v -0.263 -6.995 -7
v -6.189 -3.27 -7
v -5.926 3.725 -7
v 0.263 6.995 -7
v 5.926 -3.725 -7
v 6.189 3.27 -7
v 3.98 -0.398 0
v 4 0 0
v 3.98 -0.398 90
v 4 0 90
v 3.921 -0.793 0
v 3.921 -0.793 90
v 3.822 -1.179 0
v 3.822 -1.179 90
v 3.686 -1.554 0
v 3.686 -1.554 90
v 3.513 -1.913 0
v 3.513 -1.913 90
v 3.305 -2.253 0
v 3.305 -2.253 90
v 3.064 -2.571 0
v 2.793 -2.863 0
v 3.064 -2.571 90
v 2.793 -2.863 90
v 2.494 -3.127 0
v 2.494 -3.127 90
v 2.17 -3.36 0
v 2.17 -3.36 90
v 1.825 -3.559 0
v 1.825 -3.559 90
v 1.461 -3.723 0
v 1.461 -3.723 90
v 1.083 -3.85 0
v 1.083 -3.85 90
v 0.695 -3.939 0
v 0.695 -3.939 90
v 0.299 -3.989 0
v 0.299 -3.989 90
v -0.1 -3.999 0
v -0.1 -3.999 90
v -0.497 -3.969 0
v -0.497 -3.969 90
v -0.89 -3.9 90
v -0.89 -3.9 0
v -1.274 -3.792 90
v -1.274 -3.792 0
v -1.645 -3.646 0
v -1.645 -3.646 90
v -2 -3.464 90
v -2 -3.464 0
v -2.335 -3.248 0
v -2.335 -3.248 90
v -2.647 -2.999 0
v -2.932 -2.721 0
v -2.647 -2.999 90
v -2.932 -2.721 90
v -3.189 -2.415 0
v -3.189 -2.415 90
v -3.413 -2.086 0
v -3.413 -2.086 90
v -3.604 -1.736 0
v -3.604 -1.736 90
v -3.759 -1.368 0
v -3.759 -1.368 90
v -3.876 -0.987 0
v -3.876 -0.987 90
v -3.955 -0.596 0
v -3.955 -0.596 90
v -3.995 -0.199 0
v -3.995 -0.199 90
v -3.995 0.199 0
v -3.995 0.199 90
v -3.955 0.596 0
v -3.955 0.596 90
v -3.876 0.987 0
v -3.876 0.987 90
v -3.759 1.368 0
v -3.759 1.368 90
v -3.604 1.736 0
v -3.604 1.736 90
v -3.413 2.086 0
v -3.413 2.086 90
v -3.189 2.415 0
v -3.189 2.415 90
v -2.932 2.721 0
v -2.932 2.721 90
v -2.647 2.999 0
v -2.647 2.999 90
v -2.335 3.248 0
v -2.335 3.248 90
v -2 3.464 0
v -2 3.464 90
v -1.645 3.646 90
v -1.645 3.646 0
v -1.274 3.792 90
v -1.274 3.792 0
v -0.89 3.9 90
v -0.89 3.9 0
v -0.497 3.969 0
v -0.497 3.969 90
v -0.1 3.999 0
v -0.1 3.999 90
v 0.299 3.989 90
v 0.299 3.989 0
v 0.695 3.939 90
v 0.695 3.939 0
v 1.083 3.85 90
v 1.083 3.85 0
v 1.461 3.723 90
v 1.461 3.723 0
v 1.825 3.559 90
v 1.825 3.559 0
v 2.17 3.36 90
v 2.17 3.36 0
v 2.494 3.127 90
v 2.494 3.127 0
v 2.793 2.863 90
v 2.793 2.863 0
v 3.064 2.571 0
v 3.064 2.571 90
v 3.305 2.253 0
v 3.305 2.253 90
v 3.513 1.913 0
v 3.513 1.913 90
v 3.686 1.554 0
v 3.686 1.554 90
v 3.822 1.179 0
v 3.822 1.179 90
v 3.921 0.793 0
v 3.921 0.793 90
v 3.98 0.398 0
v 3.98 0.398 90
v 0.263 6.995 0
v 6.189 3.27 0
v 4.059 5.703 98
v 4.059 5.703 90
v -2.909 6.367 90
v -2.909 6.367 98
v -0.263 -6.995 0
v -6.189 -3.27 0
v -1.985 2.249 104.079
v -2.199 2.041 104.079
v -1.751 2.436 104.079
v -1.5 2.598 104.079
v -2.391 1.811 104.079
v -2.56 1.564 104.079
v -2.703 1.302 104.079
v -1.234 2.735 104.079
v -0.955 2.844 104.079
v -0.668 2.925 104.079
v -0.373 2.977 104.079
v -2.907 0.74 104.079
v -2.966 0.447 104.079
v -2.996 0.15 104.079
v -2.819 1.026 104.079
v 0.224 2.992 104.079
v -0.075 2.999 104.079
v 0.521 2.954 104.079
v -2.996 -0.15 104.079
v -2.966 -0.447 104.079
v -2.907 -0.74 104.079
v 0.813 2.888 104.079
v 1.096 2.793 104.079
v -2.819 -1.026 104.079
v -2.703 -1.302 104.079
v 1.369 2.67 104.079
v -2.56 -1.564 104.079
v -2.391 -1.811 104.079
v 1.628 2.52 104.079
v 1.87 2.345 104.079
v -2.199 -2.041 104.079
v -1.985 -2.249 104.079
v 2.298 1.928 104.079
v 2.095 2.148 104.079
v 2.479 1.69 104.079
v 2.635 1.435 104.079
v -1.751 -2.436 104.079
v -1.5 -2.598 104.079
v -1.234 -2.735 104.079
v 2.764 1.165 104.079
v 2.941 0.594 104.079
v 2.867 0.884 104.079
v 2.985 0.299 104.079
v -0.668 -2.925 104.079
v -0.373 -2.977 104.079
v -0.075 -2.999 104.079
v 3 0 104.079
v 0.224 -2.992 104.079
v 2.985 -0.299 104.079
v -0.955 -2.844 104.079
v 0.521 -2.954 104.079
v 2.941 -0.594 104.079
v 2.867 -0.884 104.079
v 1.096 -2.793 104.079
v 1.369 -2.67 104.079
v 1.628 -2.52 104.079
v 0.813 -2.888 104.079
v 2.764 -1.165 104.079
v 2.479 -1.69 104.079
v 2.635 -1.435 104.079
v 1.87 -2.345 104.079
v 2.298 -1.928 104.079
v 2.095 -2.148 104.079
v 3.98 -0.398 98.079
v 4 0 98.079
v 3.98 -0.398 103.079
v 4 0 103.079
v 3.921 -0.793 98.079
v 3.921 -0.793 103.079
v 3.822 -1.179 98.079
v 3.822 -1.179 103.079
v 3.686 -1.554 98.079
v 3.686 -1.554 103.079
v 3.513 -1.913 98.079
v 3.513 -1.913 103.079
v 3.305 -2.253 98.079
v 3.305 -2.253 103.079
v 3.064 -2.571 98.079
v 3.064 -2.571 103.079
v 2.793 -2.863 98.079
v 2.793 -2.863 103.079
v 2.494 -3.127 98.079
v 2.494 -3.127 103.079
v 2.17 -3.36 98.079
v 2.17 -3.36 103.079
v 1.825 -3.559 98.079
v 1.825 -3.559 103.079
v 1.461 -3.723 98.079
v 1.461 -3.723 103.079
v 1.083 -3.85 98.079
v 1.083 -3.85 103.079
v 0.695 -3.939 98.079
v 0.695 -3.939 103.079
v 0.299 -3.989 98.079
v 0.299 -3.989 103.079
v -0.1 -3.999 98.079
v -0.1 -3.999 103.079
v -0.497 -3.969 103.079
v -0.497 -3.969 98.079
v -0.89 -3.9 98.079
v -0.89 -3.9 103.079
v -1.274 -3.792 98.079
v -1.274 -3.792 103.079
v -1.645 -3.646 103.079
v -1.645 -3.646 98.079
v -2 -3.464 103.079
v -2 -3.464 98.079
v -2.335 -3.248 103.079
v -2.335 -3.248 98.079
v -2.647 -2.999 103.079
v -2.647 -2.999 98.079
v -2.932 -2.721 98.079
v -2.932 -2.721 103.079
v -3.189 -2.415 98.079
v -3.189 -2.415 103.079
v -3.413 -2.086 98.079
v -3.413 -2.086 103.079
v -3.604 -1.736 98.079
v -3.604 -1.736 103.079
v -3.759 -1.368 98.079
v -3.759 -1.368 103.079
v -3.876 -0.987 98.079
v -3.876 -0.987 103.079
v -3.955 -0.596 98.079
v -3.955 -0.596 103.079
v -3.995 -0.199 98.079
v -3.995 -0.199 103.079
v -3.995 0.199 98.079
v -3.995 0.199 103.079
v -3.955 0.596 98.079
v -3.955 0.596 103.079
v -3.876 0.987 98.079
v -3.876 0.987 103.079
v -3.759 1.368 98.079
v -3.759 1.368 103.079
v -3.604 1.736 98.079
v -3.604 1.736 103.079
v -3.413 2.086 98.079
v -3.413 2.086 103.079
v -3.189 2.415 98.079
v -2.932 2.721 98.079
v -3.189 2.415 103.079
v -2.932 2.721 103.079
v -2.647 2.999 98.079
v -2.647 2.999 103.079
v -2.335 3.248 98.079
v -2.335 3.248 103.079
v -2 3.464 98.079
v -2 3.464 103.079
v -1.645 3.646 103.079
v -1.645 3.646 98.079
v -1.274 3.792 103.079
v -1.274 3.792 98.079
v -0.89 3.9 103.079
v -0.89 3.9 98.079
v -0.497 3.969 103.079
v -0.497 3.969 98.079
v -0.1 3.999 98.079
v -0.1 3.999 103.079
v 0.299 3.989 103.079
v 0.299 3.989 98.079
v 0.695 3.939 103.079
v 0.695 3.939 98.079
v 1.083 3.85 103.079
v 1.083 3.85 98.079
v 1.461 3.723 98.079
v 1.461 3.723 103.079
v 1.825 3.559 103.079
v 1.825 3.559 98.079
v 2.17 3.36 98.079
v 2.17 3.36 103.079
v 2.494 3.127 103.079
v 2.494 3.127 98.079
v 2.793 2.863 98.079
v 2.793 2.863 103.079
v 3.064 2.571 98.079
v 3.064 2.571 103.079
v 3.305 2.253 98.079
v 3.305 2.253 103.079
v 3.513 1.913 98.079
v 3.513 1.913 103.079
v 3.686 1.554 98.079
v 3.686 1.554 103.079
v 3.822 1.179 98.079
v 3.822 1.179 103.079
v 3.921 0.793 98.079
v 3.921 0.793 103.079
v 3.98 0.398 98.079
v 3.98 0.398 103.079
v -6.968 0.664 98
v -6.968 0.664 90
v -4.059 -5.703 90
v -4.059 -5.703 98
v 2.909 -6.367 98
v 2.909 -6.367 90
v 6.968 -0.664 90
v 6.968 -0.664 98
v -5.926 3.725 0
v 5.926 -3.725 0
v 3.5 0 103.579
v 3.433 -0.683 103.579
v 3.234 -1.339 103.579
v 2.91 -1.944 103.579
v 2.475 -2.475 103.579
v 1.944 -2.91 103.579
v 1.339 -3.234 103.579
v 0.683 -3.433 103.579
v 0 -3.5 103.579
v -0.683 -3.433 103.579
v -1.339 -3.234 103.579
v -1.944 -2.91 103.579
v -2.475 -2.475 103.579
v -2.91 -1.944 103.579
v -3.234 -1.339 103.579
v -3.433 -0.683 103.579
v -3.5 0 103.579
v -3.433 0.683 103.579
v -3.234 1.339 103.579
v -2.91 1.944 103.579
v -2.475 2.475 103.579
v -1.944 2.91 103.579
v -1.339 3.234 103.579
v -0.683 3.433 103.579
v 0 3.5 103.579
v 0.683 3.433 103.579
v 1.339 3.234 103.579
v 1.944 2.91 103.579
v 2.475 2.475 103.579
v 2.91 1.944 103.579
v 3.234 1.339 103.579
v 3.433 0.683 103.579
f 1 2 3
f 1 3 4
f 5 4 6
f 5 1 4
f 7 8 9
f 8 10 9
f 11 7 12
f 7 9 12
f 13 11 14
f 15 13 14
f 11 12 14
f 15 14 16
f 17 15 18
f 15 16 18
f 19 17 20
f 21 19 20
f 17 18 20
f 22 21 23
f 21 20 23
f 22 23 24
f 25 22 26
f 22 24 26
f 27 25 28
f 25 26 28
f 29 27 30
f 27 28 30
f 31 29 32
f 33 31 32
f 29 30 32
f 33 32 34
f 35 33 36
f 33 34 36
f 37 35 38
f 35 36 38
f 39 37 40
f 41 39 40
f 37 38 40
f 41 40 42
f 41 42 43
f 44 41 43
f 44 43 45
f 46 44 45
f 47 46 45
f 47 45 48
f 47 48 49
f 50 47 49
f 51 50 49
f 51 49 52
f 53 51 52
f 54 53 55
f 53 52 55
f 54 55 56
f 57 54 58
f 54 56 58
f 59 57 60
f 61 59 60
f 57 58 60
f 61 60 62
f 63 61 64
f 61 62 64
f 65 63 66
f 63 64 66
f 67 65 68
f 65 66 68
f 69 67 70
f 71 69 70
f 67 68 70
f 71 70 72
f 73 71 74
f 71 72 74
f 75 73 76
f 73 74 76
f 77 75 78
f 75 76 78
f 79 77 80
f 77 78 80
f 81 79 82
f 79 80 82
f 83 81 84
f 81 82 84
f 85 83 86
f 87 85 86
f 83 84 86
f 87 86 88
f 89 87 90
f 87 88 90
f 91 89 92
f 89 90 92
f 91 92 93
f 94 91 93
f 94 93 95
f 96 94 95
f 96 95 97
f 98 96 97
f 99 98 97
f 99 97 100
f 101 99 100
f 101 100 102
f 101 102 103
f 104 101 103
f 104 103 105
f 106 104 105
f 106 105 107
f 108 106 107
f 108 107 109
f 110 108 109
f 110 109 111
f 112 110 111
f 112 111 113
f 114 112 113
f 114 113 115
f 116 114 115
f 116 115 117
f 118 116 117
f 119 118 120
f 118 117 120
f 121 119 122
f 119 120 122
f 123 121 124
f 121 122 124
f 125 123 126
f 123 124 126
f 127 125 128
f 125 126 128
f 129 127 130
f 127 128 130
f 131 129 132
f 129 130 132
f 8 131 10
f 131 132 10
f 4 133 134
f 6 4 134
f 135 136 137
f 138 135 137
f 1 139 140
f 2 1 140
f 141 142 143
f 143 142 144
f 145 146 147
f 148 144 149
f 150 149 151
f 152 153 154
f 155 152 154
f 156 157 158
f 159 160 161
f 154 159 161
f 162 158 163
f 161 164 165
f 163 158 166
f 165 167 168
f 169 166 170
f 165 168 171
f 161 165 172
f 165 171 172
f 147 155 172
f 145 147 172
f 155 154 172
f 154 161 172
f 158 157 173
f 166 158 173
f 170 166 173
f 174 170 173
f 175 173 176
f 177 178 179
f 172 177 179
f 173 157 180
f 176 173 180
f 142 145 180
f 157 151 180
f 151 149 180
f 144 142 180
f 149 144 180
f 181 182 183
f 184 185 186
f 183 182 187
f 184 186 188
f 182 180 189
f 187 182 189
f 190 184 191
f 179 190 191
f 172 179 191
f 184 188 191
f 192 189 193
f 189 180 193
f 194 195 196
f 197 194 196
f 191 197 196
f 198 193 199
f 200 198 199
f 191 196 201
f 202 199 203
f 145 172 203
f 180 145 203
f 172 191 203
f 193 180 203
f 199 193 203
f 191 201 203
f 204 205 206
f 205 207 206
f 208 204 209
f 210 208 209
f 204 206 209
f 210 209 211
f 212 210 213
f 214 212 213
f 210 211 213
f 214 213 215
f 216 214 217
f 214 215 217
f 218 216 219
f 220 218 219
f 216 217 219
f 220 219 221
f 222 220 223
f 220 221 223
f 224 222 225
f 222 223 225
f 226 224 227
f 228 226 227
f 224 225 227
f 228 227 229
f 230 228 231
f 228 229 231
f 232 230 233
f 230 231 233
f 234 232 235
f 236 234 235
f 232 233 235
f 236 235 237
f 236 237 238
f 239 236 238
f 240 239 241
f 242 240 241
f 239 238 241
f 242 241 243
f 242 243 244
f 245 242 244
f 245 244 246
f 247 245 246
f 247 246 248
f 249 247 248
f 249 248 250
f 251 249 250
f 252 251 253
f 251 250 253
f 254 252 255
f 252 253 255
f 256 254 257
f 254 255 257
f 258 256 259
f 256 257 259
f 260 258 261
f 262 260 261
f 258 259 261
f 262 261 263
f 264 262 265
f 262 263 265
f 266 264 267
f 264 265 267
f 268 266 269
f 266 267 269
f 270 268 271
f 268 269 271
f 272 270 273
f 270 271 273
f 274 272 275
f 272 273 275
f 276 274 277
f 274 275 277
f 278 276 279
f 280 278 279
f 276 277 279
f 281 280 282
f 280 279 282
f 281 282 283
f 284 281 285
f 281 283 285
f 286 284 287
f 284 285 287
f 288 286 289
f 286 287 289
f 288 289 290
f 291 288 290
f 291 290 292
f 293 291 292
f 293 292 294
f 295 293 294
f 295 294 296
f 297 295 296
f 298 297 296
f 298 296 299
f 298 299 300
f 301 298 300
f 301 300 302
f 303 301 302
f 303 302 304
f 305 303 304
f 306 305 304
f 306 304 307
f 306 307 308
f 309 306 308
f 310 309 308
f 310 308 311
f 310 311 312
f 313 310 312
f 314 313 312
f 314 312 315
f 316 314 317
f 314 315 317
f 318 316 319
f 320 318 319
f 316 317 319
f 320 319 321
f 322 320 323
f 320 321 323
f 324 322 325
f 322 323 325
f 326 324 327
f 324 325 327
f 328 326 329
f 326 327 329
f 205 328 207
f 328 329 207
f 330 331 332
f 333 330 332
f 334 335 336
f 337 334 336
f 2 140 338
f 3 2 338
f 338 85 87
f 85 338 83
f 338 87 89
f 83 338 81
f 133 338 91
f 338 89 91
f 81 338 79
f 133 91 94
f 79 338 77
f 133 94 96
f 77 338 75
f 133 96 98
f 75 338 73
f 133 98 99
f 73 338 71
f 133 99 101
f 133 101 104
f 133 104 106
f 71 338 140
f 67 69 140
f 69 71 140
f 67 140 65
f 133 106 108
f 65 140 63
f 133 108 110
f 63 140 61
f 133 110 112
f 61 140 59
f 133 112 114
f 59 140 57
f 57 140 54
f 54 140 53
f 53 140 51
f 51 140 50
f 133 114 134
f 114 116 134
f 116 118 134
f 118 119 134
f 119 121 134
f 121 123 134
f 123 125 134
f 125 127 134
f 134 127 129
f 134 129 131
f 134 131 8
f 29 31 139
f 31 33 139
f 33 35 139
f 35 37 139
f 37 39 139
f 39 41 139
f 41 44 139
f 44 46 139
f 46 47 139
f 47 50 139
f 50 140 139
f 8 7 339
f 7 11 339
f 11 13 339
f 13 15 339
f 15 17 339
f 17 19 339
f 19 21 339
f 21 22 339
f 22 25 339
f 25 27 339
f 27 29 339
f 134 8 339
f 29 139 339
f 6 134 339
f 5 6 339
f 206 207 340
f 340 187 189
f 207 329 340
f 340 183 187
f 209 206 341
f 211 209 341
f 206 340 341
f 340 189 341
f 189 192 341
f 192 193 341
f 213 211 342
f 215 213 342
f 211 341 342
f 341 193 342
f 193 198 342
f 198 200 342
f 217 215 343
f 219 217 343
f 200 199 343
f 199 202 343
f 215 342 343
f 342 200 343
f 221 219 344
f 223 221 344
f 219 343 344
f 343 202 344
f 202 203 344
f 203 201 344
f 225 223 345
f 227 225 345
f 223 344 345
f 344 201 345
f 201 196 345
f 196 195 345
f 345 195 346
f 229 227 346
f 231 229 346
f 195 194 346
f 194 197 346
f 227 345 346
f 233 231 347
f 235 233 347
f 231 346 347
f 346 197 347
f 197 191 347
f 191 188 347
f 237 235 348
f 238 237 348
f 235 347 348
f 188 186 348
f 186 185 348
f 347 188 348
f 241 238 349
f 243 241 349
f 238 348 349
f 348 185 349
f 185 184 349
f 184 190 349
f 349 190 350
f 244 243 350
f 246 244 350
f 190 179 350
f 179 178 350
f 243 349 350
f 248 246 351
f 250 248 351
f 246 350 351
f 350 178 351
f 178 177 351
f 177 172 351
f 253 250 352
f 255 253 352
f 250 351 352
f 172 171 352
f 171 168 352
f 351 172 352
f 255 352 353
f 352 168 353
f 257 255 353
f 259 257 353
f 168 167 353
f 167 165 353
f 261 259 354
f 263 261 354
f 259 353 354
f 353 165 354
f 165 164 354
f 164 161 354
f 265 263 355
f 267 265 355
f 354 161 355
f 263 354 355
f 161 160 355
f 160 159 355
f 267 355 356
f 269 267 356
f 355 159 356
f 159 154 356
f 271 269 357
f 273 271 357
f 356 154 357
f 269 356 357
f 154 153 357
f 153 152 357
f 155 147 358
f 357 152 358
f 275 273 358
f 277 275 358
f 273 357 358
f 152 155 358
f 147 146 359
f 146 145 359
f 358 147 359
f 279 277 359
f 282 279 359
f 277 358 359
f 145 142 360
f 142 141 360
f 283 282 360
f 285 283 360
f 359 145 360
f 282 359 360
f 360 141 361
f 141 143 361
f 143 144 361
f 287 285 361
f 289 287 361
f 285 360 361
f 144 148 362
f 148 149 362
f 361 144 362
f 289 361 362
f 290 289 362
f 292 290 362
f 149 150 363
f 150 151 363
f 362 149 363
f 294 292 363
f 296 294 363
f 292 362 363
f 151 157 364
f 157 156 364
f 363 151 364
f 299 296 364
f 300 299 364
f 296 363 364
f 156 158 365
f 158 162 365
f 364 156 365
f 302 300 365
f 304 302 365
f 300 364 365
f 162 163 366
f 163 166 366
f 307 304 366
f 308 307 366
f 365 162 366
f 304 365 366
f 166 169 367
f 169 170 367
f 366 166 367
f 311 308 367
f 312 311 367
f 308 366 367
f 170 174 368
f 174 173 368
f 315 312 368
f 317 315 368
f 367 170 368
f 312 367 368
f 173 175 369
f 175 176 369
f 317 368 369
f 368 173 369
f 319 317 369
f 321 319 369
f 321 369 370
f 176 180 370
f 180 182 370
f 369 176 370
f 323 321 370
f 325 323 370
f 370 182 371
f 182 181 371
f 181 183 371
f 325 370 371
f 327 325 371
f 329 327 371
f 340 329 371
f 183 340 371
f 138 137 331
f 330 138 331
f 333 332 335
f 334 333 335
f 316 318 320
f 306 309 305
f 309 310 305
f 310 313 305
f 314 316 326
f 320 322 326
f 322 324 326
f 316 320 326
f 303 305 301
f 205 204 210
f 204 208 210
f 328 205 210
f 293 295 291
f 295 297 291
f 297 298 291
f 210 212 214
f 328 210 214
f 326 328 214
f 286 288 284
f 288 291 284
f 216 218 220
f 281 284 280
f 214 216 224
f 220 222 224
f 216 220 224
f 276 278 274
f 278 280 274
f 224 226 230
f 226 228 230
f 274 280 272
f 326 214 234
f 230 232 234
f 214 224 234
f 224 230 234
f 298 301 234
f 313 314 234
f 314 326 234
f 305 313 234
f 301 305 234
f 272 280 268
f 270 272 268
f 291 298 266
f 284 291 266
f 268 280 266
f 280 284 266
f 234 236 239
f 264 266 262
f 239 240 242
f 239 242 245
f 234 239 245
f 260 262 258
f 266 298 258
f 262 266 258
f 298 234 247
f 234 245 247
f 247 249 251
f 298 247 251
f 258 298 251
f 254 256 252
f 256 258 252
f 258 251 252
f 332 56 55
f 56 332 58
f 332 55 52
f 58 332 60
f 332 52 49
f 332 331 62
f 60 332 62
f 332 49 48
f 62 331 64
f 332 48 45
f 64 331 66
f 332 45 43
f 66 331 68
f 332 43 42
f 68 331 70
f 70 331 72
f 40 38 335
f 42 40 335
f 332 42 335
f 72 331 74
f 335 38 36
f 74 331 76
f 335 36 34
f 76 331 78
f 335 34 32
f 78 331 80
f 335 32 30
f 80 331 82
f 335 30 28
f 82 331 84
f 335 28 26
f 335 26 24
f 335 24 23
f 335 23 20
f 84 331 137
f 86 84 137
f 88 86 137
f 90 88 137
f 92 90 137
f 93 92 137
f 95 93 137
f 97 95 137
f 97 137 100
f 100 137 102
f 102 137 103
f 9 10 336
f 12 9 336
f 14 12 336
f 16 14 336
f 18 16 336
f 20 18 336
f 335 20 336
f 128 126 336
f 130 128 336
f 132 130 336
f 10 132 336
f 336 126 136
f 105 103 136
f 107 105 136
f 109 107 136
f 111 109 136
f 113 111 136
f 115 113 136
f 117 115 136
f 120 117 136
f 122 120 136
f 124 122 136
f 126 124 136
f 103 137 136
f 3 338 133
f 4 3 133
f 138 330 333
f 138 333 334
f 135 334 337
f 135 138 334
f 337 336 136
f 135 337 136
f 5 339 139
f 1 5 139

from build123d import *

# Parameters (mm, degrees)
F3_DEPTH = 7
F5_DEPTH = 8


with BuildPart() as f1:
    # F0 (on Front) → F1 (revolve)
    with BuildSketch(Plane.XZ):
        Polygon((4, 0), (4, 90), (0, 90), (0, 65), (0, 0), align=None)
    revolve(axis=Axis((0, 0, 32.5), (0, 0, -1)))

    # F2 (on face) → F3 (join)
    with BuildSketch(Plane(origin=(0, 0, 0), x_dir=(1, 0, 0), z_dir=(0, 0, -1))):
        Polygon((6.189313, -3.269925), (5.926495, 3.725139), (-0.262818, 6.995064), (-6.189313, 3.269925), (-5.926495, -3.725139), (0.262818, -6.995064), align=None)
    extrude(amount=F3_DEPTH)

    # F4 (on face) → F5 (join)
    with BuildSketch(Plane.XY.offset(90)):
        Polygon((6.968457, -0.663784), (4.059082, 5.702969), (-2.909374, 6.366753), (-6.968457, 0.663784), (-4.059082, -5.702969), (2.909374, -6.366753), align=None)
    extrude(amount=F5_DEPTH)


with BuildPart() as f7:
    # F6 (on Front) → F7 (revolve)
    with BuildSketch(Plane.XZ):
        Polygon((0, 104.079421), (0, 98.079421), (4, 98.079421), (4, 103.079421), (3, 104.079421), align=None)
    revolve(axis=Axis((0, 0, 101.079421), (0, 0, -1)))


solid = Compound([f1.part, f7.part])
